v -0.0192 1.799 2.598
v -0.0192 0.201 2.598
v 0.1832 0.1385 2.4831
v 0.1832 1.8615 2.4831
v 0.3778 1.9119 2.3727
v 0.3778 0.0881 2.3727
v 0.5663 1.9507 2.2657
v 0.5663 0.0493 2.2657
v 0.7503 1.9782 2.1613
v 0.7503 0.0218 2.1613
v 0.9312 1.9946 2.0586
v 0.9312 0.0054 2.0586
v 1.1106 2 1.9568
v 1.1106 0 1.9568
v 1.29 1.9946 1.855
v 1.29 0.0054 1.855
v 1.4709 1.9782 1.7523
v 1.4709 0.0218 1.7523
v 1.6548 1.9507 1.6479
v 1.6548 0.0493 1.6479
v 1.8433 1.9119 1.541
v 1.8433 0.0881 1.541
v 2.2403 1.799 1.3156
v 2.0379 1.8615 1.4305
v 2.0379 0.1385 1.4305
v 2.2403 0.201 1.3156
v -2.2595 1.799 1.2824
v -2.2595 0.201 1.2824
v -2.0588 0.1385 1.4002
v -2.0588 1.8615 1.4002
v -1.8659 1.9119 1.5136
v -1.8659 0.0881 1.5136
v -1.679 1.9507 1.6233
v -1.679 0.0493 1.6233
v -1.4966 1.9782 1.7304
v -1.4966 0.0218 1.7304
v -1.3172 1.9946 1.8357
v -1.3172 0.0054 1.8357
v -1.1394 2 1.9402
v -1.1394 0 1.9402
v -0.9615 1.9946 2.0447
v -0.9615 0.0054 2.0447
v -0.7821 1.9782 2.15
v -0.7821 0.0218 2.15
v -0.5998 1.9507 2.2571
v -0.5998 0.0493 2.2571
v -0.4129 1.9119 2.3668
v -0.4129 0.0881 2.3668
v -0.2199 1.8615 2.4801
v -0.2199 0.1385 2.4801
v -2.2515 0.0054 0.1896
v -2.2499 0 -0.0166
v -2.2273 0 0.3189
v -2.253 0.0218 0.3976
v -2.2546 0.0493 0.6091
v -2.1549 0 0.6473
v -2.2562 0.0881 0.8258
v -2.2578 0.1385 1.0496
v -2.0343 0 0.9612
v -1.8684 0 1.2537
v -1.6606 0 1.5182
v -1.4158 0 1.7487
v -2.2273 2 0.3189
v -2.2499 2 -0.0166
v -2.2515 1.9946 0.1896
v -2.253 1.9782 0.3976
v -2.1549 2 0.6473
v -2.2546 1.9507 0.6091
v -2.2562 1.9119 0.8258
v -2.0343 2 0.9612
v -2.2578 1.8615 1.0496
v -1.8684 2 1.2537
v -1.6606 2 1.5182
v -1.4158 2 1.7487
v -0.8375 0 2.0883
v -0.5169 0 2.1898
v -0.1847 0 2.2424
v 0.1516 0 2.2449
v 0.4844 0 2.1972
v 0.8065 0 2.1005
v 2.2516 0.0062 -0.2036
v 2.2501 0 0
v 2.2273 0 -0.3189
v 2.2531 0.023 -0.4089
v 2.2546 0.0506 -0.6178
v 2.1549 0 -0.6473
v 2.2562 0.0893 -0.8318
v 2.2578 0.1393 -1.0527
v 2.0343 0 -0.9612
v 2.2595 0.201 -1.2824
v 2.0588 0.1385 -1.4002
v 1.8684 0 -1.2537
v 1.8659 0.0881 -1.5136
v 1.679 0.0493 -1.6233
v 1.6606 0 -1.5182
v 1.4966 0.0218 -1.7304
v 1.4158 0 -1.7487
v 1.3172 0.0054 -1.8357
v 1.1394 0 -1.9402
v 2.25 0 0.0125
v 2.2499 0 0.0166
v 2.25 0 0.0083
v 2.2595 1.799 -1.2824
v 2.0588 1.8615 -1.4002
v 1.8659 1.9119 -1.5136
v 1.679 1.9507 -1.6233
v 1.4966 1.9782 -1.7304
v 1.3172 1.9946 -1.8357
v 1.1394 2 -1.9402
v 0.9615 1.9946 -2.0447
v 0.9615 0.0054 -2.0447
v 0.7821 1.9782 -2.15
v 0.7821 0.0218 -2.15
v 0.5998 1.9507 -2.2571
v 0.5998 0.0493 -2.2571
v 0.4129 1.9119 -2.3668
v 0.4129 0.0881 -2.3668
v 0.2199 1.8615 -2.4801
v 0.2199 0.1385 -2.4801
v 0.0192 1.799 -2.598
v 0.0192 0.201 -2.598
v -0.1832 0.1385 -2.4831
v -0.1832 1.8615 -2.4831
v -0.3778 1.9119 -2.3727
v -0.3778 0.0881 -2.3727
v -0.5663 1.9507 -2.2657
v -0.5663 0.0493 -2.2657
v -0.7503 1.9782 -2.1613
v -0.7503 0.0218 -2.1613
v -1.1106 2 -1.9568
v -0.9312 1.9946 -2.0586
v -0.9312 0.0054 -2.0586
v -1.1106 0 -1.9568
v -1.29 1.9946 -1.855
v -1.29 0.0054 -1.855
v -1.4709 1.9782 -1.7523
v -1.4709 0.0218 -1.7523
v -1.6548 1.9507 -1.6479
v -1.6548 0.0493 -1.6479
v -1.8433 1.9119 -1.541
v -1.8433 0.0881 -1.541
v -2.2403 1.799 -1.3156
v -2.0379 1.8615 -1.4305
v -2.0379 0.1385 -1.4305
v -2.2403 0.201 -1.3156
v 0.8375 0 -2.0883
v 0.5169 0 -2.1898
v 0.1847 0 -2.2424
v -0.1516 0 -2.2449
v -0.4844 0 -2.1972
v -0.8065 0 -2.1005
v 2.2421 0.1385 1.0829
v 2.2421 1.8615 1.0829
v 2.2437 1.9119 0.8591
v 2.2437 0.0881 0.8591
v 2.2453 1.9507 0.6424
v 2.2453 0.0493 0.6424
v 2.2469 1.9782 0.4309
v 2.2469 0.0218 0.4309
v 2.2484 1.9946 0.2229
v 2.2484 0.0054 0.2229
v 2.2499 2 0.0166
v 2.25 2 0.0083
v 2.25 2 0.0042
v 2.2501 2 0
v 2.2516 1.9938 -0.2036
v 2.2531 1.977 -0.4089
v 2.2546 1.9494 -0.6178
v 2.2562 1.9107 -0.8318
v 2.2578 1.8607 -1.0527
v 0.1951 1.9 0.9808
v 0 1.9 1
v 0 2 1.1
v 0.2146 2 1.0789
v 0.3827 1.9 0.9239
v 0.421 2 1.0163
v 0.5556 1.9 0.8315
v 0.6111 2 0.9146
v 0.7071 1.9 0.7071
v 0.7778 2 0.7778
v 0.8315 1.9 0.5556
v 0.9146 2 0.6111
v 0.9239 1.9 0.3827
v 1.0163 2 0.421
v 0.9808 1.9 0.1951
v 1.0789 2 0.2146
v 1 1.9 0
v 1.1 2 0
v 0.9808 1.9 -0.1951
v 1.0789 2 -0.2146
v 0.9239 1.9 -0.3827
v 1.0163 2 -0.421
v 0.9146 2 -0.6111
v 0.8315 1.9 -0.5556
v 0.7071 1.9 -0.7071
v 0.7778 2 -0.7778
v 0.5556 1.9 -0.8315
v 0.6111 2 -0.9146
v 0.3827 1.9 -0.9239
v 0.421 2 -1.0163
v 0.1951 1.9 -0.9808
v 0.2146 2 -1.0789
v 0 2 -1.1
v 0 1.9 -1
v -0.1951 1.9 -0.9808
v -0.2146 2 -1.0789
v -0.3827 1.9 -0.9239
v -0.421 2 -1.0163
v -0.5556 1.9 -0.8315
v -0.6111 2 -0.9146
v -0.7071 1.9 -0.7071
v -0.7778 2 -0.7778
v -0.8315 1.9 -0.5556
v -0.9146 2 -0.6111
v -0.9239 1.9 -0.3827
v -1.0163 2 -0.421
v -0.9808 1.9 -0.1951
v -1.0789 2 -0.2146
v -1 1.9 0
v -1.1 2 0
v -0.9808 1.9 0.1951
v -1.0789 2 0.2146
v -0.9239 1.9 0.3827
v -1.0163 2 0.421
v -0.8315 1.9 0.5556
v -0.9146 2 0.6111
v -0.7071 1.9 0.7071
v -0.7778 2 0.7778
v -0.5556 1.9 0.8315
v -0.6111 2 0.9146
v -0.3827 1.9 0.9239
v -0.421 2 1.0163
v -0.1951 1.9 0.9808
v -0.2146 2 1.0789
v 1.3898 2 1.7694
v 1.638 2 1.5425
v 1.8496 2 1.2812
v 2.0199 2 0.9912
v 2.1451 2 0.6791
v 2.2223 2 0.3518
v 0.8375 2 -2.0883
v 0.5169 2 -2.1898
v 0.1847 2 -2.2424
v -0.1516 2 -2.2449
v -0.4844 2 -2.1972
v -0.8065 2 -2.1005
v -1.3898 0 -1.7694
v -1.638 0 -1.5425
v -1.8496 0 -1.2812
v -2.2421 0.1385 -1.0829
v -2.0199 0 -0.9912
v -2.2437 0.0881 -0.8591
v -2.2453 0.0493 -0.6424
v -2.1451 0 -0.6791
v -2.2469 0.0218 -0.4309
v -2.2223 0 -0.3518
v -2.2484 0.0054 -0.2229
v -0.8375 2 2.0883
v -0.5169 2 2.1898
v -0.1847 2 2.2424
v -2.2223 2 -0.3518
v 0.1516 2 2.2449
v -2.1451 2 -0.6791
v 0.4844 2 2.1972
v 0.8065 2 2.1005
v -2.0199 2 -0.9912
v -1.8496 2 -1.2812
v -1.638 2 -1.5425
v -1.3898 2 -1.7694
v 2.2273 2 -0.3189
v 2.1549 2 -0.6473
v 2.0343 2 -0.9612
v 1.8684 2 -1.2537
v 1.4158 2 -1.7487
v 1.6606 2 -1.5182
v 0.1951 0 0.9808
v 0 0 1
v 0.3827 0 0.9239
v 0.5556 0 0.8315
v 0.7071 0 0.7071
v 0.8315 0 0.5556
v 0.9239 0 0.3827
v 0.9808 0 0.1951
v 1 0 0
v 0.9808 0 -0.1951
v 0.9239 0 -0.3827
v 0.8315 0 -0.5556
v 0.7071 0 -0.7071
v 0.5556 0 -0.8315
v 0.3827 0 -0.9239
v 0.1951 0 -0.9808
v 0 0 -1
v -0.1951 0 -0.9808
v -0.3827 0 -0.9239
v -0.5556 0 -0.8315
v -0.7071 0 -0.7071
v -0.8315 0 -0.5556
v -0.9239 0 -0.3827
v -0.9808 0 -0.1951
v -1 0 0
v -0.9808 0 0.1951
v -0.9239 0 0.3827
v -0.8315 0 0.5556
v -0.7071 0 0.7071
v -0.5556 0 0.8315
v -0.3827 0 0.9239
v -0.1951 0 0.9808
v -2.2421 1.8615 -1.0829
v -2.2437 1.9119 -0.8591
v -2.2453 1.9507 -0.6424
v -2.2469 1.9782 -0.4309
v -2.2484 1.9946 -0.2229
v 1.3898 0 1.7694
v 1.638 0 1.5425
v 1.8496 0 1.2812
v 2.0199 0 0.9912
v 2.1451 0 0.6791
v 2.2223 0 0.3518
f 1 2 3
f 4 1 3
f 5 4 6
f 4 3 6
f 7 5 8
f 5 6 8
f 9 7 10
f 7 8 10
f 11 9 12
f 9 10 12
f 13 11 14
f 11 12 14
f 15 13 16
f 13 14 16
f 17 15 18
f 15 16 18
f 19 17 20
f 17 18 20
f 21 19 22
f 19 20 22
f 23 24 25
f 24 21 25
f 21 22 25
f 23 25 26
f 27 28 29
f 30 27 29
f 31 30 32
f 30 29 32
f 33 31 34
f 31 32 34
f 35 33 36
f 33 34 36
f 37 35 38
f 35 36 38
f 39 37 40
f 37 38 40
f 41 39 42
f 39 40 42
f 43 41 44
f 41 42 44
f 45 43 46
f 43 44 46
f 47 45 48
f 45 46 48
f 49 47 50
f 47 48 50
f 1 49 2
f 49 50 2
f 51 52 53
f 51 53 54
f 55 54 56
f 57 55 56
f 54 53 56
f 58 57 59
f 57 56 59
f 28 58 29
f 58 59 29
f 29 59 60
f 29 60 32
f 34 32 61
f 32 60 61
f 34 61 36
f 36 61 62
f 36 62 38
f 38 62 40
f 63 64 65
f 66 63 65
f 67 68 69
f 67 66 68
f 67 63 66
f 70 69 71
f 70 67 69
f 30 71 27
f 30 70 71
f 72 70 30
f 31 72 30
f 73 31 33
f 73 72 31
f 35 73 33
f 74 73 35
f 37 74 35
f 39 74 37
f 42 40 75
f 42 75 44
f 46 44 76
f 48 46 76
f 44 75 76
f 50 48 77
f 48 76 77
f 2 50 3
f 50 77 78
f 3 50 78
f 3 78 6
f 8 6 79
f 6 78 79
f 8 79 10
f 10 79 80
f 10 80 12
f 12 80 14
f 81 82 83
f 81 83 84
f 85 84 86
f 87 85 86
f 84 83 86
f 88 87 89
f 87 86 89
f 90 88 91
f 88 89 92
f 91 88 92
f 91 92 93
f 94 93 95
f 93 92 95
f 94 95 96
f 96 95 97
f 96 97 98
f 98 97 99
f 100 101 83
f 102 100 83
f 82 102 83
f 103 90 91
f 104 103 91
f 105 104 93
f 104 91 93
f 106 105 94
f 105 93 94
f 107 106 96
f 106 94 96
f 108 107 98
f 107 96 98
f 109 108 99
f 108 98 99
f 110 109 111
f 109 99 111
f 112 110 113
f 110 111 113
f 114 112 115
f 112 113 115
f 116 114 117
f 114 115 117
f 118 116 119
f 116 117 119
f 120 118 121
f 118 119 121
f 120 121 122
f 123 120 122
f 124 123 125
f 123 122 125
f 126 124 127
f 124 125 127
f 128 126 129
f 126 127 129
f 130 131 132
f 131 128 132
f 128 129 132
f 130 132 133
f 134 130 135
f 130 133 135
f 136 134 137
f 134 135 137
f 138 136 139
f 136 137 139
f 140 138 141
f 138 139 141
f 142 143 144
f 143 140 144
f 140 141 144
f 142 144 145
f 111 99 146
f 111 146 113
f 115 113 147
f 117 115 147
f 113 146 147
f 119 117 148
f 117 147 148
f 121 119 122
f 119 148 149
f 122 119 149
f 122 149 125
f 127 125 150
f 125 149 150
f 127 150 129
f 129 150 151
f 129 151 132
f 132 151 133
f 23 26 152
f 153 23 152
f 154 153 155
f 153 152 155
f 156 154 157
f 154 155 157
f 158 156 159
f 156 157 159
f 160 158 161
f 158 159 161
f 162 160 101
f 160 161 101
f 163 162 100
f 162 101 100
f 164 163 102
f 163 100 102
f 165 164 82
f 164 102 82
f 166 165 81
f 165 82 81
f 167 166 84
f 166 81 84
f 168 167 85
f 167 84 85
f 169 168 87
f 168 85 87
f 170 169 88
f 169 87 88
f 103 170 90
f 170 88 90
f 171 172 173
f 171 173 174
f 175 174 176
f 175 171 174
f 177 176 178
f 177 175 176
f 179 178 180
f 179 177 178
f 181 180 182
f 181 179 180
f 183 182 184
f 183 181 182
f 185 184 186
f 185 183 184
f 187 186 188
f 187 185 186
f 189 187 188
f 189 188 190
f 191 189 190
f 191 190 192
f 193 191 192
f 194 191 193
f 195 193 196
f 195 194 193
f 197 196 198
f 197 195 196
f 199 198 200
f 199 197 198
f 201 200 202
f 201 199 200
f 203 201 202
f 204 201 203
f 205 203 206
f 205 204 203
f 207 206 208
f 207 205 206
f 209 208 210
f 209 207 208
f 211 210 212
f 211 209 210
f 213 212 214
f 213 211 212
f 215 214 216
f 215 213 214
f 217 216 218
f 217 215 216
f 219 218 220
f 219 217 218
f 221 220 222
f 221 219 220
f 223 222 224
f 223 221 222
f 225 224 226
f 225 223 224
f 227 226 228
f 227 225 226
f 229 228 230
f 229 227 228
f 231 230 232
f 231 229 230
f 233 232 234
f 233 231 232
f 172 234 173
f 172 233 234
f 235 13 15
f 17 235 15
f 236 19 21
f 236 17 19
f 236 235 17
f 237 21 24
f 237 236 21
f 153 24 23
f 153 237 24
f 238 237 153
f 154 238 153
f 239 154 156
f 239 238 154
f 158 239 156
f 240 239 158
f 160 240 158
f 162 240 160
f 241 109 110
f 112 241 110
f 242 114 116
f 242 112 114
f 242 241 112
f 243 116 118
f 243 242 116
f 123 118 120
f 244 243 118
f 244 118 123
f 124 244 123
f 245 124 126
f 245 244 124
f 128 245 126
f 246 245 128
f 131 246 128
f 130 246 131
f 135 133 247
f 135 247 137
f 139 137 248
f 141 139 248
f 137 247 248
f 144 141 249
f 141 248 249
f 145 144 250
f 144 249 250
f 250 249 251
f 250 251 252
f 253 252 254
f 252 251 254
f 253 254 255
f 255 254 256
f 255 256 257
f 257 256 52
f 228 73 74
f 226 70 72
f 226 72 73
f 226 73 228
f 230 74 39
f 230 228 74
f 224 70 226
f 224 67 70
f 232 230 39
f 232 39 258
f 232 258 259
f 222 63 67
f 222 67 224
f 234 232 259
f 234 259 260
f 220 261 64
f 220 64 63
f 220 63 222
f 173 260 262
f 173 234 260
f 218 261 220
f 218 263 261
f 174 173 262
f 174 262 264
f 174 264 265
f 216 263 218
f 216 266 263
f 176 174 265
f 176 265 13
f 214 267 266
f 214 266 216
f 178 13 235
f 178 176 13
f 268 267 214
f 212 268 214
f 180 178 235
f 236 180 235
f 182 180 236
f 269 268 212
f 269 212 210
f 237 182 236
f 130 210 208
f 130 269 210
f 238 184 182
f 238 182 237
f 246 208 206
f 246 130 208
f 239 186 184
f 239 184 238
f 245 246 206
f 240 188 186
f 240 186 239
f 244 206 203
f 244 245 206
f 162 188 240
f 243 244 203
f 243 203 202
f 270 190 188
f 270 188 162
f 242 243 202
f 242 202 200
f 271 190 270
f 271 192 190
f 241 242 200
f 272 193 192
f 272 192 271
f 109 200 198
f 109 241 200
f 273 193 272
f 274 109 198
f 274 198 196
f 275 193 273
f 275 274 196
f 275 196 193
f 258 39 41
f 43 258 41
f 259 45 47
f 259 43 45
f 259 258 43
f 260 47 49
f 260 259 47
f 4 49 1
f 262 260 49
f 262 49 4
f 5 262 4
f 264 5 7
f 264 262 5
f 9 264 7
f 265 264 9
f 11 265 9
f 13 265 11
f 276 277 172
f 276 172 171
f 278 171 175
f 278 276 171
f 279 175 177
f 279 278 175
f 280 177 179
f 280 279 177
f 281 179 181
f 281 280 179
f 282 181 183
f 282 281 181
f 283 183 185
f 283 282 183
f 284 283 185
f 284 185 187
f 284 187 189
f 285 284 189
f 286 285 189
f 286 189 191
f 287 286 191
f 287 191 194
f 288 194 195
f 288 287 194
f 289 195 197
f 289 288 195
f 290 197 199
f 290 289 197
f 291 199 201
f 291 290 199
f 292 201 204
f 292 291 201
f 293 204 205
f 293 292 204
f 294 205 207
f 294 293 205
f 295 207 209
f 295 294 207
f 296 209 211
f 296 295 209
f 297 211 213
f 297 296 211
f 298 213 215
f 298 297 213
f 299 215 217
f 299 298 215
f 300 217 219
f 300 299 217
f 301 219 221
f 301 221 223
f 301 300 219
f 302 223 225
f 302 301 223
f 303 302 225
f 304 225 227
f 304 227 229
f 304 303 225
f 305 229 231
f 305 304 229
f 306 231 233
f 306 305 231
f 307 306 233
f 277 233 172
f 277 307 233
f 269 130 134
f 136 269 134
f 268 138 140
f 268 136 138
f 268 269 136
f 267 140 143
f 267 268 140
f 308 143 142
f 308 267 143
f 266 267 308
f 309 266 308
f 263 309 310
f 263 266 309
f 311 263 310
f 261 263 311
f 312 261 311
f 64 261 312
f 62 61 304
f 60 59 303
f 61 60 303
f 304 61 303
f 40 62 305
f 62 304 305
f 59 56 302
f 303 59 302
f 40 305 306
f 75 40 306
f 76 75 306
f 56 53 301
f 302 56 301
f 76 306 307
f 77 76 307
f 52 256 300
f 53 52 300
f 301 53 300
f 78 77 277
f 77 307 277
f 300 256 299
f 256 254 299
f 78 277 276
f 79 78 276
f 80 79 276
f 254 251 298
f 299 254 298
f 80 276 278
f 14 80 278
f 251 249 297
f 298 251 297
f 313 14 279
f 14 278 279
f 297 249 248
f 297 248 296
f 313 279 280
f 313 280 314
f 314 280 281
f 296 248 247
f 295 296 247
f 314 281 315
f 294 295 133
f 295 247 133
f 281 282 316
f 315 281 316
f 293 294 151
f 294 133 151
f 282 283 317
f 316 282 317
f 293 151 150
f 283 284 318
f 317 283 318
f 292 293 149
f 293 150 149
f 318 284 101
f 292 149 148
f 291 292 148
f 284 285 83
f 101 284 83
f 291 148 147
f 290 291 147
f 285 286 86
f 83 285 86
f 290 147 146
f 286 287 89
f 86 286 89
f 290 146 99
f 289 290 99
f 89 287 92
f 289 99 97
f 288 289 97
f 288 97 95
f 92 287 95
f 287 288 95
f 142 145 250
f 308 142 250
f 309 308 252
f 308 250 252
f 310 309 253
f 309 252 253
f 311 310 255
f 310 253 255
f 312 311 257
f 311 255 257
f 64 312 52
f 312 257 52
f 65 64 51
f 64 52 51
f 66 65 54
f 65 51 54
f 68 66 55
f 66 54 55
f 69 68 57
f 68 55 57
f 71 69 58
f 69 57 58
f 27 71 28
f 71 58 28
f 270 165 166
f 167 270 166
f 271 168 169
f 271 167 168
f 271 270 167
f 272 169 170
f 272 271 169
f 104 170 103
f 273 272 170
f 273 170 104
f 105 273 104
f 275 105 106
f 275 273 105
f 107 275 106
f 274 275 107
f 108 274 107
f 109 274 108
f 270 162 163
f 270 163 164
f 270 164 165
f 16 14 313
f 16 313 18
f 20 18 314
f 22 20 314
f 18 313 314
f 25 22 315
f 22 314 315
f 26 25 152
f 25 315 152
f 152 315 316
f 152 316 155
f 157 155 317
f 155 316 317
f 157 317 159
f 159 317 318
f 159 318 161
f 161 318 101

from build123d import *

# Parameters (mm, degrees)
SKETCH1_R           = 1
BOSS_EXTRUDE1_DEPTH = 2
SKETCH2_OUTSIDE_W   = 14.882
SKETCH2_OUTSIDE_H   = 15.558
SKETCH2_OUTSIDE_R   = 2.25
CUT_EXTRUDE1_DEPTH  = 2
CUT_EXTRUDE1_DRAFT  = 60
SKETCH3_OUTSIDE_W   = 14.882
SKETCH3_OUTSIDE_H   = 15.558
SKETCH3_OUTSIDE_R   = 2.25
CUT_EXTRUDE3_DEPTH  = 2
CUT_EXTRUDE3_DRAFT  = -60
CHAMFER1_SIZE       = 0.1


with BuildPart() as part:
    # Sketch1 → Boss-Extrude1 (new body)
    with BuildSketch(Plane(origin=(0, 0, 0), x_dir=(1, 0, 0), z_dir=(0, 1, 0))):
        Polygon((2.24033649, -1.315633845), (2.259540576, 1.282371391), (0.019204087, 2.598005235), (-2.24033649, 1.315633845), (-2.259540576, -1.282371391), (-0.019204087, -2.598005235), align=None)
        with Locations(Location((0, 0, 0), (0, 0, 270))):
            Circle(SKETCH1_R, mode=Mode.SUBTRACT)
    extrude(amount=BOSS_EXTRUDE1_DEPTH)


with BuildPart() as cut_extrude1_tool:
    # Sketch2 outside → Cut-Extrude1 (with draft: the straight prism first)
    with BuildSketch(Plane(origin=(0, 0, 0), x_dir=(1, 0, 0), z_dir=(0, 1, 0))):
        Rectangle(SKETCH2_OUTSIDE_W, SKETCH2_OUTSIDE_H)
        Circle(SKETCH2_OUTSIDE_R, mode=Mode.SUBTRACT)
    extrude(amount=CUT_EXTRUDE1_DEPTH)
    # Cut-Extrude1: the draft: its side faces are tilted about the plane it starts from
    cut_extrude1_sides = [cut_extrude1_tool.faces().sort_by_distance(p)[0] for p in [
        (0, 1, 7.779),
        (7.441, 1, 0),
        (0, 1, -7.779),
        (-7.441, 1, 0),
        (-2.25, 1, 0),
    ]]
    draft(cut_extrude1_sides, Plane(origin=(0, 0, 0), x_dir=(1, 0, 0), z_dir=(0, 1, 0)), CUT_EXTRUDE1_DRAFT)


with BuildPart() as part_1:
    add(part.part)

    # Cut-Extrude1: cut by cut_extrude1_tool
    add(cut_extrude1_tool.part, mode=Mode.SUBTRACT)


with BuildPart() as cut_extrude3_tool:
    # Sketch3 outside → Cut-Extrude3 (with draft: the straight prism first)
    with BuildSketch(Plane(origin=(0, 2, 0), x_dir=(1, 0, 0), z_dir=(0, 1, 0))):
        Rectangle(SKETCH3_OUTSIDE_W, SKETCH3_OUTSIDE_H)
        Circle(SKETCH3_OUTSIDE_R, mode=Mode.SUBTRACT)
    extrude(amount=-CUT_EXTRUDE3_DEPTH)
    # Cut-Extrude3: the draft: its side faces are tilted about the plane it starts from
    cut_extrude3_sides = [cut_extrude3_tool.faces().sort_by_distance(p)[0] for p in [
        (0, 1, 7.779),
        (7.441, 1, 0),
        (0, 1, -7.779),
        (-7.441, 1, 0),
        (-2.25, 1, 0),
    ]]
    draft(cut_extrude3_sides, Plane(origin=(0, 2, 0), x_dir=(1, 0, 0), z_dir=(0, 1, 0)), CUT_EXTRUDE3_DRAFT)


with BuildPart() as part_2:
    add(part_1.part)

    # Cut-Extrude3: cut by cut_extrude3_tool
    add(cut_extrude3_tool.part, mode=Mode.SUBTRACT)

    # Chamfer1
    chamfer1_edges = [part_2.edges().sort_by_distance(p)[0] for p in [
        (0, 2, -1),
    ]]
    chamfer(chamfer1_edges, length=CHAMFER1_SIZE)


solid = part_2.part
